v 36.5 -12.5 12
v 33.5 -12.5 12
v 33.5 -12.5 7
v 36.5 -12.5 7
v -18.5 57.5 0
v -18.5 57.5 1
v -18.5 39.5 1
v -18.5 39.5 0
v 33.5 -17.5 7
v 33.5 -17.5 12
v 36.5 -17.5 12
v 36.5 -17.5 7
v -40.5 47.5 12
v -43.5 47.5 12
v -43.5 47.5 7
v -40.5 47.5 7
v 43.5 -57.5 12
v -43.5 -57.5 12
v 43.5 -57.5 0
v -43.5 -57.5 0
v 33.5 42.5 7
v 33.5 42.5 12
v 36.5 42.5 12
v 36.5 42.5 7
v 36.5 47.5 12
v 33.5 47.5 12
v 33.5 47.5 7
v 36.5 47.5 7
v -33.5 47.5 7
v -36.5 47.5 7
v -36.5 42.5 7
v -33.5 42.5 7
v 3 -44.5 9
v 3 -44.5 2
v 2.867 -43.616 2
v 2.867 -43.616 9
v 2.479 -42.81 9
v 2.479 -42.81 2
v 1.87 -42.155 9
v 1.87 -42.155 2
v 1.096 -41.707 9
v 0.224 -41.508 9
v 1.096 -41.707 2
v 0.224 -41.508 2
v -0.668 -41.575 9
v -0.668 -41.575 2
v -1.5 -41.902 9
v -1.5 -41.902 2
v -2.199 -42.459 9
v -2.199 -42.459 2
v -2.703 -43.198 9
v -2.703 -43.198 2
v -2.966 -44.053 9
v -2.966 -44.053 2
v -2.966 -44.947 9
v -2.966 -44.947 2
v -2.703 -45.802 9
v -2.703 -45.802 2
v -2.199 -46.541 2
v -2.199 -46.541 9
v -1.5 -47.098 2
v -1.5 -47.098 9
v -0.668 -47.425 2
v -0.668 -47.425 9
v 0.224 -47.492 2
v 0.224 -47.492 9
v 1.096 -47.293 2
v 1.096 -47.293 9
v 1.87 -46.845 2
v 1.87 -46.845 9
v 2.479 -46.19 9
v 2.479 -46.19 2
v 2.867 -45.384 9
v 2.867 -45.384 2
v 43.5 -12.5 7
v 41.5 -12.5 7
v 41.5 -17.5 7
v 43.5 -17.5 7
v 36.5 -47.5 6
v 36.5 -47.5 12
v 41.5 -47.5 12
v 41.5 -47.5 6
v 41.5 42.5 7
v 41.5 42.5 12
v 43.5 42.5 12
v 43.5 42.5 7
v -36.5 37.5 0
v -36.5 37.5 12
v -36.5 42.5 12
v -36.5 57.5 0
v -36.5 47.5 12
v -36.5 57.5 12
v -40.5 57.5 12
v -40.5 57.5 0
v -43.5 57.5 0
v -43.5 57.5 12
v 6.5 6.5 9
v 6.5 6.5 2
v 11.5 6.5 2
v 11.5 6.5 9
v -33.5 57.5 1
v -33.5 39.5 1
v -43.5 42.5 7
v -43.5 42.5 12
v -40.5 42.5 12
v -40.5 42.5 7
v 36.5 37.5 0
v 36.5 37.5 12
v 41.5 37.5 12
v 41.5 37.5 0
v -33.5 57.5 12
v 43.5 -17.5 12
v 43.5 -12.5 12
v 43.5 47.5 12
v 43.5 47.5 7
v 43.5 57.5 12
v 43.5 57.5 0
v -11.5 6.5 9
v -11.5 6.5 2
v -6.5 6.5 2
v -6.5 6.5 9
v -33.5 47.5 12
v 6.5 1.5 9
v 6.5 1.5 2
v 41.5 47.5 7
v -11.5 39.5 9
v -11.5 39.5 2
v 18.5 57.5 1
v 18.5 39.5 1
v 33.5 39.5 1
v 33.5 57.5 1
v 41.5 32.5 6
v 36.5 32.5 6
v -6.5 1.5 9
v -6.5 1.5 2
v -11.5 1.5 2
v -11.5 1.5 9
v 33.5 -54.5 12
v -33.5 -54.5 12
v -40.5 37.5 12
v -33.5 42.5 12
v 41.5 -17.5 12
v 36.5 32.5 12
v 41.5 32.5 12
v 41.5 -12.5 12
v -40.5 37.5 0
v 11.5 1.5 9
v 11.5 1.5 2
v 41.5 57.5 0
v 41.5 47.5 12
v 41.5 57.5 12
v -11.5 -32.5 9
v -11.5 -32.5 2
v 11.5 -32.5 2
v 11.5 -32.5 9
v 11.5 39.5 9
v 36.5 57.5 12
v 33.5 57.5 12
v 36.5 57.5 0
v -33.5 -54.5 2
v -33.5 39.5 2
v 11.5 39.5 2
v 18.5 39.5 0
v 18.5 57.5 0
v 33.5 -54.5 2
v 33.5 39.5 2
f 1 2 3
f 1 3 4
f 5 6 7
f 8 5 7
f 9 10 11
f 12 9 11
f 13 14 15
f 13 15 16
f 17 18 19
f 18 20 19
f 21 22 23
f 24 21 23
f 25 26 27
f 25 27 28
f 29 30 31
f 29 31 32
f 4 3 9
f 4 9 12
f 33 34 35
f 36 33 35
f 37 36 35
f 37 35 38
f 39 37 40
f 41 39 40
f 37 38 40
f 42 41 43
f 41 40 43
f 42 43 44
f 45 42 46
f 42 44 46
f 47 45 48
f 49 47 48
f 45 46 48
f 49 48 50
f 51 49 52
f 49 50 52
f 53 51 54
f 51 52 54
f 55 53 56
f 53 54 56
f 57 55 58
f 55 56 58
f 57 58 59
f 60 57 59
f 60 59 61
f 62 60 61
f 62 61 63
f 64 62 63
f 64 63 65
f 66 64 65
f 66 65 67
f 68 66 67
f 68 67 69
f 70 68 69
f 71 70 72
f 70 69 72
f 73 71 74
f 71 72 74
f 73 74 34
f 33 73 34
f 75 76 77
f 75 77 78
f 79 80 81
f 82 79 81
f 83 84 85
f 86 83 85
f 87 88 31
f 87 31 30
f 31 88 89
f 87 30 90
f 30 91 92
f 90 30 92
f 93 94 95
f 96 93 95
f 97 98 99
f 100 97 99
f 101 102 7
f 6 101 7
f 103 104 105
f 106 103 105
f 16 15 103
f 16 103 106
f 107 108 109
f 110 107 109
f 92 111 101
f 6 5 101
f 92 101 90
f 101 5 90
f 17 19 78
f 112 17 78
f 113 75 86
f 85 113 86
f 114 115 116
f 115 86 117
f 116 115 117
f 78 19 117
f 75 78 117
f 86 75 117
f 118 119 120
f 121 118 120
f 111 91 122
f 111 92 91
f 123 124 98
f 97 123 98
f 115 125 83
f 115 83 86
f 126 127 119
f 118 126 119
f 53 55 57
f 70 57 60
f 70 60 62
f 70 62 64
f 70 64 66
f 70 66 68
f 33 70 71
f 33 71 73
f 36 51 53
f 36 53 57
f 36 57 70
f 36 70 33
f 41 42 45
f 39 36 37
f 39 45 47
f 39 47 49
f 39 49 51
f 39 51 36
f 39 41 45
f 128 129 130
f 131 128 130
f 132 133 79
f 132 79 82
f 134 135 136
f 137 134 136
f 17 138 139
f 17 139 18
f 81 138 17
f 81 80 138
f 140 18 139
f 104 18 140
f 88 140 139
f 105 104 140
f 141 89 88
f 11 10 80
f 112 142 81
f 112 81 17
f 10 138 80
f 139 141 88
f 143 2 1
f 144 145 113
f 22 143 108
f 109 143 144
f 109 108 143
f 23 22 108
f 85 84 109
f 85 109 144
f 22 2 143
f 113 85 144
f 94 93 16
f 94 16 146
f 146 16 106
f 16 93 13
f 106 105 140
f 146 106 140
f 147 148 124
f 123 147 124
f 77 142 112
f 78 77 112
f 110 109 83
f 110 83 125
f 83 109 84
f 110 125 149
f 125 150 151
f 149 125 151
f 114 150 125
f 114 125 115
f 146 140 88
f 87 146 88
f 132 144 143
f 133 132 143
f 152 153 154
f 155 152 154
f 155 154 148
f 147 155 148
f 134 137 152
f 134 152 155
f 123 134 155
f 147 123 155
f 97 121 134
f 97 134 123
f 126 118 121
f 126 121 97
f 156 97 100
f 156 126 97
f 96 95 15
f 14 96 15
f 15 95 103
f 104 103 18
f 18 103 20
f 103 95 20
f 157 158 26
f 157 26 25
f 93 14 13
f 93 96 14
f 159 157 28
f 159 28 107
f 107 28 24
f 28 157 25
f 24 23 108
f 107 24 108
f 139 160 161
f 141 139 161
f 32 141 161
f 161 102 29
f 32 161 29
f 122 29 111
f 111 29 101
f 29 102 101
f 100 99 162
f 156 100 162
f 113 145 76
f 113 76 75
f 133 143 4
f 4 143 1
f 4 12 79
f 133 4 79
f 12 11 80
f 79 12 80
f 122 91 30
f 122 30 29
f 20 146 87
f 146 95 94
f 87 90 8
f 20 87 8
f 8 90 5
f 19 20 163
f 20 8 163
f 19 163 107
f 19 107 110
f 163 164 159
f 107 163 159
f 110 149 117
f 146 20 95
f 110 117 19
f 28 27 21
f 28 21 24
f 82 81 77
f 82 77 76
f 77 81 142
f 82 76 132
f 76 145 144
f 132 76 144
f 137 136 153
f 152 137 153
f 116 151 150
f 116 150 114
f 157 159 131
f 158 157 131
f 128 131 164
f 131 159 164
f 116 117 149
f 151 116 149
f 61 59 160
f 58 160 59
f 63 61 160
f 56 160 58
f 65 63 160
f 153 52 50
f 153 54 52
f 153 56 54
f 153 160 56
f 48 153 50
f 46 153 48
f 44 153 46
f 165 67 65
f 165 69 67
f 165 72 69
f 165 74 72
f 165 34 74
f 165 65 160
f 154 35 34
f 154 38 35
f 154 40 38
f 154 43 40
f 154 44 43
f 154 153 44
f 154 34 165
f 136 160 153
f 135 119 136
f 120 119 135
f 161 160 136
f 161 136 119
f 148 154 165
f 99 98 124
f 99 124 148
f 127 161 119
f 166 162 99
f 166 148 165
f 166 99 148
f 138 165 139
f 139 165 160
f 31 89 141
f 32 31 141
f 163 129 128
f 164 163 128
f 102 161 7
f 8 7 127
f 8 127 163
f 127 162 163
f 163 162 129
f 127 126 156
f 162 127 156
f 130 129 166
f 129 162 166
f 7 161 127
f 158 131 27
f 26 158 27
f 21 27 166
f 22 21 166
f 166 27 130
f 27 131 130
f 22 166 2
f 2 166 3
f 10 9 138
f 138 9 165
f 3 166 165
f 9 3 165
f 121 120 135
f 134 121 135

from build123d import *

# Parameters (mm, degrees)
F0_W      = 87
F0_H      = 115
F1_DEPTH  = 2
F3_DEPTH  = 10
F2_R      = 3
F4_DEPTH  = 7
F5_DEPTH  = 7
F7_DEPTH  = 25
F8_DEPTH  = 6
F6_W      = 5
F6_H      = 5.0000016391
F6_H_2    = 4.9999983609
F6_H_3    = 4.999999553
F6_H_4    = 5.000000447
F9_DEPTH  = 25
F6_W_2    = 3
F10_DEPTH = 5
F2_W      = 15
F2_H      = 18
F11_DEPTH = 1
F6_W_3    = 2
F12_DEPTH = 5
F6_H_5    = 4.9999998137
F13_DEPTH = 5


with BuildPart() as f1:
    # F0 (on Top) → F1 (new body)
    with BuildSketch(Plane.XY):
        Rectangle(F0_W, F0_H)
    extrude(amount=F1_DEPTH)

    # F2 (on face) → F3 (join)
    with BuildSketch(Plane.XY.offset(2)):
        Polygon((33.5, -54.5), (-33.5, -54.5), (-33.5, 39.5), (-33.5, 57.5), (-43.5, 57.5), (-43.5, -57.5), (43.5, -57.5), (43.5, 57.5), (33.5, 57.5), (33.5, 39.5), align=None)
    extrude(amount=F3_DEPTH)

    # F2 (on face) → F4 (join)
    with BuildSketch(Plane.XY.offset(2)):
        with Locations((0, -44.5)):
            Circle(F2_R)
    extrude(amount=F4_DEPTH)

    # F2 (on face) → F5 (join)
    with BuildSketch(Plane.XY.offset(2)):
        Polygon((11.5, 39.5), (-11.5, 39.5), (-11.5, 6.5), (-6.5, 6.5), (-6.5, 1.5), (-11.5, 1.5), (-11.5, -32.5), (11.5, -32.5), (11.5, 1.5), (6.5, 1.5), (6.5, 6.5), (11.5, 6.5), align=None)
    extrude(amount=F5_DEPTH)

    # F2 (on face) → F7 (cut)
    with BuildSketch(Plane.XY.offset(2)):
        Polygon((-18.5, 57.5), (-18.5, 39.5), (-11.5, 39.5), (11.5, 39.5), (18.5, 39.5), (18.5, 57.5), align=None)
    extrude(amount=-F7_DEPTH, mode=Mode.SUBTRACT)

    # F6 (on face) → F8 (cut)
    with BuildSketch(Plane.XY.offset(12)):
        Polygon((41.5, -12.5000001863), (41.5, 32.5), (36.5, 32.5), (36.5, -12.5000001863), (36.5, -17.5), (36.5, -47.5), (41.5, -47.5), (41.5, -17.5), align=None)
    extrude(amount=-F8_DEPTH, mode=Mode.SUBTRACT)

    # F6 (on face) → F9 (cut)
    with BuildSketch(Plane.XY.offset(12)):
        Polygon((-40.5, 47.5), (-40.5, 42.500000447), (-40.5, 37.5), (-36.5, 37.5), (-36.5, 42.500000447), (-36.5, 47.5), (-36.5, 57.5), (-40.5, 57.5), align=None)
        with Locations((39, 54.9999991804)):
            Rectangle(F6_W, F6_H)
        with Locations((39, 49.9999991804)):
            Rectangle(F6_W, F6_H_2)
        with Locations((39, 45.0000002235)):
            Rectangle(F6_W, F6_H_3)
        with Locations((39, 40.0000002235)):
            Rectangle(F6_W, F6_H_4)
    extrude(amount=-F9_DEPTH, mode=Mode.SUBTRACT)

    # F6 (on face) → F10 (cut)
    with BuildSketch(Plane.XY.offset(12)):
        with Locations((-42, 45.0000002235)):
            Rectangle(F6_W_2, F6_H_3)
        with Locations((-35, 45.0000002235)):
            Rectangle(F6_W_2, F6_H_3)
    extrude(amount=-F10_DEPTH, mode=Mode.SUBTRACT)

    # F2 (on face) → F11 (cut)
    with BuildSketch(Plane.XY.offset(2)):
        with Locations((-26, 48.5)):
            Rectangle(F2_W, F2_H)
        with Locations((26, 48.5)):
            Rectangle(F2_W, F2_H)
    extrude(amount=-F11_DEPTH, mode=Mode.SUBTRACT)

    # F6 (on face) → F12 (cut)
    with BuildSketch(Plane.XY.offset(12)):
        with Locations((35, 45.0000002235)):
            Rectangle(F6_W_2, F6_H_3)
        with Locations((42.5, 45.0000002235)):
            Rectangle(F6_W_3, F6_H_3)
    extrude(amount=-F12_DEPTH, mode=Mode.SUBTRACT)

    # F6 (on face) → F13 (cut)
    with BuildSketch(Plane.XY.offset(12)):
        with Locations((35, -15.0000000931)):
            Rectangle(F6_W_2, F6_H_5)
        with Locations((42.5, -15.0000000931)):
            Rectangle(F6_W_3, F6_H_5)
    extrude(amount=-F13_DEPTH, mode=Mode.SUBTRACT)


solid = f1.part
